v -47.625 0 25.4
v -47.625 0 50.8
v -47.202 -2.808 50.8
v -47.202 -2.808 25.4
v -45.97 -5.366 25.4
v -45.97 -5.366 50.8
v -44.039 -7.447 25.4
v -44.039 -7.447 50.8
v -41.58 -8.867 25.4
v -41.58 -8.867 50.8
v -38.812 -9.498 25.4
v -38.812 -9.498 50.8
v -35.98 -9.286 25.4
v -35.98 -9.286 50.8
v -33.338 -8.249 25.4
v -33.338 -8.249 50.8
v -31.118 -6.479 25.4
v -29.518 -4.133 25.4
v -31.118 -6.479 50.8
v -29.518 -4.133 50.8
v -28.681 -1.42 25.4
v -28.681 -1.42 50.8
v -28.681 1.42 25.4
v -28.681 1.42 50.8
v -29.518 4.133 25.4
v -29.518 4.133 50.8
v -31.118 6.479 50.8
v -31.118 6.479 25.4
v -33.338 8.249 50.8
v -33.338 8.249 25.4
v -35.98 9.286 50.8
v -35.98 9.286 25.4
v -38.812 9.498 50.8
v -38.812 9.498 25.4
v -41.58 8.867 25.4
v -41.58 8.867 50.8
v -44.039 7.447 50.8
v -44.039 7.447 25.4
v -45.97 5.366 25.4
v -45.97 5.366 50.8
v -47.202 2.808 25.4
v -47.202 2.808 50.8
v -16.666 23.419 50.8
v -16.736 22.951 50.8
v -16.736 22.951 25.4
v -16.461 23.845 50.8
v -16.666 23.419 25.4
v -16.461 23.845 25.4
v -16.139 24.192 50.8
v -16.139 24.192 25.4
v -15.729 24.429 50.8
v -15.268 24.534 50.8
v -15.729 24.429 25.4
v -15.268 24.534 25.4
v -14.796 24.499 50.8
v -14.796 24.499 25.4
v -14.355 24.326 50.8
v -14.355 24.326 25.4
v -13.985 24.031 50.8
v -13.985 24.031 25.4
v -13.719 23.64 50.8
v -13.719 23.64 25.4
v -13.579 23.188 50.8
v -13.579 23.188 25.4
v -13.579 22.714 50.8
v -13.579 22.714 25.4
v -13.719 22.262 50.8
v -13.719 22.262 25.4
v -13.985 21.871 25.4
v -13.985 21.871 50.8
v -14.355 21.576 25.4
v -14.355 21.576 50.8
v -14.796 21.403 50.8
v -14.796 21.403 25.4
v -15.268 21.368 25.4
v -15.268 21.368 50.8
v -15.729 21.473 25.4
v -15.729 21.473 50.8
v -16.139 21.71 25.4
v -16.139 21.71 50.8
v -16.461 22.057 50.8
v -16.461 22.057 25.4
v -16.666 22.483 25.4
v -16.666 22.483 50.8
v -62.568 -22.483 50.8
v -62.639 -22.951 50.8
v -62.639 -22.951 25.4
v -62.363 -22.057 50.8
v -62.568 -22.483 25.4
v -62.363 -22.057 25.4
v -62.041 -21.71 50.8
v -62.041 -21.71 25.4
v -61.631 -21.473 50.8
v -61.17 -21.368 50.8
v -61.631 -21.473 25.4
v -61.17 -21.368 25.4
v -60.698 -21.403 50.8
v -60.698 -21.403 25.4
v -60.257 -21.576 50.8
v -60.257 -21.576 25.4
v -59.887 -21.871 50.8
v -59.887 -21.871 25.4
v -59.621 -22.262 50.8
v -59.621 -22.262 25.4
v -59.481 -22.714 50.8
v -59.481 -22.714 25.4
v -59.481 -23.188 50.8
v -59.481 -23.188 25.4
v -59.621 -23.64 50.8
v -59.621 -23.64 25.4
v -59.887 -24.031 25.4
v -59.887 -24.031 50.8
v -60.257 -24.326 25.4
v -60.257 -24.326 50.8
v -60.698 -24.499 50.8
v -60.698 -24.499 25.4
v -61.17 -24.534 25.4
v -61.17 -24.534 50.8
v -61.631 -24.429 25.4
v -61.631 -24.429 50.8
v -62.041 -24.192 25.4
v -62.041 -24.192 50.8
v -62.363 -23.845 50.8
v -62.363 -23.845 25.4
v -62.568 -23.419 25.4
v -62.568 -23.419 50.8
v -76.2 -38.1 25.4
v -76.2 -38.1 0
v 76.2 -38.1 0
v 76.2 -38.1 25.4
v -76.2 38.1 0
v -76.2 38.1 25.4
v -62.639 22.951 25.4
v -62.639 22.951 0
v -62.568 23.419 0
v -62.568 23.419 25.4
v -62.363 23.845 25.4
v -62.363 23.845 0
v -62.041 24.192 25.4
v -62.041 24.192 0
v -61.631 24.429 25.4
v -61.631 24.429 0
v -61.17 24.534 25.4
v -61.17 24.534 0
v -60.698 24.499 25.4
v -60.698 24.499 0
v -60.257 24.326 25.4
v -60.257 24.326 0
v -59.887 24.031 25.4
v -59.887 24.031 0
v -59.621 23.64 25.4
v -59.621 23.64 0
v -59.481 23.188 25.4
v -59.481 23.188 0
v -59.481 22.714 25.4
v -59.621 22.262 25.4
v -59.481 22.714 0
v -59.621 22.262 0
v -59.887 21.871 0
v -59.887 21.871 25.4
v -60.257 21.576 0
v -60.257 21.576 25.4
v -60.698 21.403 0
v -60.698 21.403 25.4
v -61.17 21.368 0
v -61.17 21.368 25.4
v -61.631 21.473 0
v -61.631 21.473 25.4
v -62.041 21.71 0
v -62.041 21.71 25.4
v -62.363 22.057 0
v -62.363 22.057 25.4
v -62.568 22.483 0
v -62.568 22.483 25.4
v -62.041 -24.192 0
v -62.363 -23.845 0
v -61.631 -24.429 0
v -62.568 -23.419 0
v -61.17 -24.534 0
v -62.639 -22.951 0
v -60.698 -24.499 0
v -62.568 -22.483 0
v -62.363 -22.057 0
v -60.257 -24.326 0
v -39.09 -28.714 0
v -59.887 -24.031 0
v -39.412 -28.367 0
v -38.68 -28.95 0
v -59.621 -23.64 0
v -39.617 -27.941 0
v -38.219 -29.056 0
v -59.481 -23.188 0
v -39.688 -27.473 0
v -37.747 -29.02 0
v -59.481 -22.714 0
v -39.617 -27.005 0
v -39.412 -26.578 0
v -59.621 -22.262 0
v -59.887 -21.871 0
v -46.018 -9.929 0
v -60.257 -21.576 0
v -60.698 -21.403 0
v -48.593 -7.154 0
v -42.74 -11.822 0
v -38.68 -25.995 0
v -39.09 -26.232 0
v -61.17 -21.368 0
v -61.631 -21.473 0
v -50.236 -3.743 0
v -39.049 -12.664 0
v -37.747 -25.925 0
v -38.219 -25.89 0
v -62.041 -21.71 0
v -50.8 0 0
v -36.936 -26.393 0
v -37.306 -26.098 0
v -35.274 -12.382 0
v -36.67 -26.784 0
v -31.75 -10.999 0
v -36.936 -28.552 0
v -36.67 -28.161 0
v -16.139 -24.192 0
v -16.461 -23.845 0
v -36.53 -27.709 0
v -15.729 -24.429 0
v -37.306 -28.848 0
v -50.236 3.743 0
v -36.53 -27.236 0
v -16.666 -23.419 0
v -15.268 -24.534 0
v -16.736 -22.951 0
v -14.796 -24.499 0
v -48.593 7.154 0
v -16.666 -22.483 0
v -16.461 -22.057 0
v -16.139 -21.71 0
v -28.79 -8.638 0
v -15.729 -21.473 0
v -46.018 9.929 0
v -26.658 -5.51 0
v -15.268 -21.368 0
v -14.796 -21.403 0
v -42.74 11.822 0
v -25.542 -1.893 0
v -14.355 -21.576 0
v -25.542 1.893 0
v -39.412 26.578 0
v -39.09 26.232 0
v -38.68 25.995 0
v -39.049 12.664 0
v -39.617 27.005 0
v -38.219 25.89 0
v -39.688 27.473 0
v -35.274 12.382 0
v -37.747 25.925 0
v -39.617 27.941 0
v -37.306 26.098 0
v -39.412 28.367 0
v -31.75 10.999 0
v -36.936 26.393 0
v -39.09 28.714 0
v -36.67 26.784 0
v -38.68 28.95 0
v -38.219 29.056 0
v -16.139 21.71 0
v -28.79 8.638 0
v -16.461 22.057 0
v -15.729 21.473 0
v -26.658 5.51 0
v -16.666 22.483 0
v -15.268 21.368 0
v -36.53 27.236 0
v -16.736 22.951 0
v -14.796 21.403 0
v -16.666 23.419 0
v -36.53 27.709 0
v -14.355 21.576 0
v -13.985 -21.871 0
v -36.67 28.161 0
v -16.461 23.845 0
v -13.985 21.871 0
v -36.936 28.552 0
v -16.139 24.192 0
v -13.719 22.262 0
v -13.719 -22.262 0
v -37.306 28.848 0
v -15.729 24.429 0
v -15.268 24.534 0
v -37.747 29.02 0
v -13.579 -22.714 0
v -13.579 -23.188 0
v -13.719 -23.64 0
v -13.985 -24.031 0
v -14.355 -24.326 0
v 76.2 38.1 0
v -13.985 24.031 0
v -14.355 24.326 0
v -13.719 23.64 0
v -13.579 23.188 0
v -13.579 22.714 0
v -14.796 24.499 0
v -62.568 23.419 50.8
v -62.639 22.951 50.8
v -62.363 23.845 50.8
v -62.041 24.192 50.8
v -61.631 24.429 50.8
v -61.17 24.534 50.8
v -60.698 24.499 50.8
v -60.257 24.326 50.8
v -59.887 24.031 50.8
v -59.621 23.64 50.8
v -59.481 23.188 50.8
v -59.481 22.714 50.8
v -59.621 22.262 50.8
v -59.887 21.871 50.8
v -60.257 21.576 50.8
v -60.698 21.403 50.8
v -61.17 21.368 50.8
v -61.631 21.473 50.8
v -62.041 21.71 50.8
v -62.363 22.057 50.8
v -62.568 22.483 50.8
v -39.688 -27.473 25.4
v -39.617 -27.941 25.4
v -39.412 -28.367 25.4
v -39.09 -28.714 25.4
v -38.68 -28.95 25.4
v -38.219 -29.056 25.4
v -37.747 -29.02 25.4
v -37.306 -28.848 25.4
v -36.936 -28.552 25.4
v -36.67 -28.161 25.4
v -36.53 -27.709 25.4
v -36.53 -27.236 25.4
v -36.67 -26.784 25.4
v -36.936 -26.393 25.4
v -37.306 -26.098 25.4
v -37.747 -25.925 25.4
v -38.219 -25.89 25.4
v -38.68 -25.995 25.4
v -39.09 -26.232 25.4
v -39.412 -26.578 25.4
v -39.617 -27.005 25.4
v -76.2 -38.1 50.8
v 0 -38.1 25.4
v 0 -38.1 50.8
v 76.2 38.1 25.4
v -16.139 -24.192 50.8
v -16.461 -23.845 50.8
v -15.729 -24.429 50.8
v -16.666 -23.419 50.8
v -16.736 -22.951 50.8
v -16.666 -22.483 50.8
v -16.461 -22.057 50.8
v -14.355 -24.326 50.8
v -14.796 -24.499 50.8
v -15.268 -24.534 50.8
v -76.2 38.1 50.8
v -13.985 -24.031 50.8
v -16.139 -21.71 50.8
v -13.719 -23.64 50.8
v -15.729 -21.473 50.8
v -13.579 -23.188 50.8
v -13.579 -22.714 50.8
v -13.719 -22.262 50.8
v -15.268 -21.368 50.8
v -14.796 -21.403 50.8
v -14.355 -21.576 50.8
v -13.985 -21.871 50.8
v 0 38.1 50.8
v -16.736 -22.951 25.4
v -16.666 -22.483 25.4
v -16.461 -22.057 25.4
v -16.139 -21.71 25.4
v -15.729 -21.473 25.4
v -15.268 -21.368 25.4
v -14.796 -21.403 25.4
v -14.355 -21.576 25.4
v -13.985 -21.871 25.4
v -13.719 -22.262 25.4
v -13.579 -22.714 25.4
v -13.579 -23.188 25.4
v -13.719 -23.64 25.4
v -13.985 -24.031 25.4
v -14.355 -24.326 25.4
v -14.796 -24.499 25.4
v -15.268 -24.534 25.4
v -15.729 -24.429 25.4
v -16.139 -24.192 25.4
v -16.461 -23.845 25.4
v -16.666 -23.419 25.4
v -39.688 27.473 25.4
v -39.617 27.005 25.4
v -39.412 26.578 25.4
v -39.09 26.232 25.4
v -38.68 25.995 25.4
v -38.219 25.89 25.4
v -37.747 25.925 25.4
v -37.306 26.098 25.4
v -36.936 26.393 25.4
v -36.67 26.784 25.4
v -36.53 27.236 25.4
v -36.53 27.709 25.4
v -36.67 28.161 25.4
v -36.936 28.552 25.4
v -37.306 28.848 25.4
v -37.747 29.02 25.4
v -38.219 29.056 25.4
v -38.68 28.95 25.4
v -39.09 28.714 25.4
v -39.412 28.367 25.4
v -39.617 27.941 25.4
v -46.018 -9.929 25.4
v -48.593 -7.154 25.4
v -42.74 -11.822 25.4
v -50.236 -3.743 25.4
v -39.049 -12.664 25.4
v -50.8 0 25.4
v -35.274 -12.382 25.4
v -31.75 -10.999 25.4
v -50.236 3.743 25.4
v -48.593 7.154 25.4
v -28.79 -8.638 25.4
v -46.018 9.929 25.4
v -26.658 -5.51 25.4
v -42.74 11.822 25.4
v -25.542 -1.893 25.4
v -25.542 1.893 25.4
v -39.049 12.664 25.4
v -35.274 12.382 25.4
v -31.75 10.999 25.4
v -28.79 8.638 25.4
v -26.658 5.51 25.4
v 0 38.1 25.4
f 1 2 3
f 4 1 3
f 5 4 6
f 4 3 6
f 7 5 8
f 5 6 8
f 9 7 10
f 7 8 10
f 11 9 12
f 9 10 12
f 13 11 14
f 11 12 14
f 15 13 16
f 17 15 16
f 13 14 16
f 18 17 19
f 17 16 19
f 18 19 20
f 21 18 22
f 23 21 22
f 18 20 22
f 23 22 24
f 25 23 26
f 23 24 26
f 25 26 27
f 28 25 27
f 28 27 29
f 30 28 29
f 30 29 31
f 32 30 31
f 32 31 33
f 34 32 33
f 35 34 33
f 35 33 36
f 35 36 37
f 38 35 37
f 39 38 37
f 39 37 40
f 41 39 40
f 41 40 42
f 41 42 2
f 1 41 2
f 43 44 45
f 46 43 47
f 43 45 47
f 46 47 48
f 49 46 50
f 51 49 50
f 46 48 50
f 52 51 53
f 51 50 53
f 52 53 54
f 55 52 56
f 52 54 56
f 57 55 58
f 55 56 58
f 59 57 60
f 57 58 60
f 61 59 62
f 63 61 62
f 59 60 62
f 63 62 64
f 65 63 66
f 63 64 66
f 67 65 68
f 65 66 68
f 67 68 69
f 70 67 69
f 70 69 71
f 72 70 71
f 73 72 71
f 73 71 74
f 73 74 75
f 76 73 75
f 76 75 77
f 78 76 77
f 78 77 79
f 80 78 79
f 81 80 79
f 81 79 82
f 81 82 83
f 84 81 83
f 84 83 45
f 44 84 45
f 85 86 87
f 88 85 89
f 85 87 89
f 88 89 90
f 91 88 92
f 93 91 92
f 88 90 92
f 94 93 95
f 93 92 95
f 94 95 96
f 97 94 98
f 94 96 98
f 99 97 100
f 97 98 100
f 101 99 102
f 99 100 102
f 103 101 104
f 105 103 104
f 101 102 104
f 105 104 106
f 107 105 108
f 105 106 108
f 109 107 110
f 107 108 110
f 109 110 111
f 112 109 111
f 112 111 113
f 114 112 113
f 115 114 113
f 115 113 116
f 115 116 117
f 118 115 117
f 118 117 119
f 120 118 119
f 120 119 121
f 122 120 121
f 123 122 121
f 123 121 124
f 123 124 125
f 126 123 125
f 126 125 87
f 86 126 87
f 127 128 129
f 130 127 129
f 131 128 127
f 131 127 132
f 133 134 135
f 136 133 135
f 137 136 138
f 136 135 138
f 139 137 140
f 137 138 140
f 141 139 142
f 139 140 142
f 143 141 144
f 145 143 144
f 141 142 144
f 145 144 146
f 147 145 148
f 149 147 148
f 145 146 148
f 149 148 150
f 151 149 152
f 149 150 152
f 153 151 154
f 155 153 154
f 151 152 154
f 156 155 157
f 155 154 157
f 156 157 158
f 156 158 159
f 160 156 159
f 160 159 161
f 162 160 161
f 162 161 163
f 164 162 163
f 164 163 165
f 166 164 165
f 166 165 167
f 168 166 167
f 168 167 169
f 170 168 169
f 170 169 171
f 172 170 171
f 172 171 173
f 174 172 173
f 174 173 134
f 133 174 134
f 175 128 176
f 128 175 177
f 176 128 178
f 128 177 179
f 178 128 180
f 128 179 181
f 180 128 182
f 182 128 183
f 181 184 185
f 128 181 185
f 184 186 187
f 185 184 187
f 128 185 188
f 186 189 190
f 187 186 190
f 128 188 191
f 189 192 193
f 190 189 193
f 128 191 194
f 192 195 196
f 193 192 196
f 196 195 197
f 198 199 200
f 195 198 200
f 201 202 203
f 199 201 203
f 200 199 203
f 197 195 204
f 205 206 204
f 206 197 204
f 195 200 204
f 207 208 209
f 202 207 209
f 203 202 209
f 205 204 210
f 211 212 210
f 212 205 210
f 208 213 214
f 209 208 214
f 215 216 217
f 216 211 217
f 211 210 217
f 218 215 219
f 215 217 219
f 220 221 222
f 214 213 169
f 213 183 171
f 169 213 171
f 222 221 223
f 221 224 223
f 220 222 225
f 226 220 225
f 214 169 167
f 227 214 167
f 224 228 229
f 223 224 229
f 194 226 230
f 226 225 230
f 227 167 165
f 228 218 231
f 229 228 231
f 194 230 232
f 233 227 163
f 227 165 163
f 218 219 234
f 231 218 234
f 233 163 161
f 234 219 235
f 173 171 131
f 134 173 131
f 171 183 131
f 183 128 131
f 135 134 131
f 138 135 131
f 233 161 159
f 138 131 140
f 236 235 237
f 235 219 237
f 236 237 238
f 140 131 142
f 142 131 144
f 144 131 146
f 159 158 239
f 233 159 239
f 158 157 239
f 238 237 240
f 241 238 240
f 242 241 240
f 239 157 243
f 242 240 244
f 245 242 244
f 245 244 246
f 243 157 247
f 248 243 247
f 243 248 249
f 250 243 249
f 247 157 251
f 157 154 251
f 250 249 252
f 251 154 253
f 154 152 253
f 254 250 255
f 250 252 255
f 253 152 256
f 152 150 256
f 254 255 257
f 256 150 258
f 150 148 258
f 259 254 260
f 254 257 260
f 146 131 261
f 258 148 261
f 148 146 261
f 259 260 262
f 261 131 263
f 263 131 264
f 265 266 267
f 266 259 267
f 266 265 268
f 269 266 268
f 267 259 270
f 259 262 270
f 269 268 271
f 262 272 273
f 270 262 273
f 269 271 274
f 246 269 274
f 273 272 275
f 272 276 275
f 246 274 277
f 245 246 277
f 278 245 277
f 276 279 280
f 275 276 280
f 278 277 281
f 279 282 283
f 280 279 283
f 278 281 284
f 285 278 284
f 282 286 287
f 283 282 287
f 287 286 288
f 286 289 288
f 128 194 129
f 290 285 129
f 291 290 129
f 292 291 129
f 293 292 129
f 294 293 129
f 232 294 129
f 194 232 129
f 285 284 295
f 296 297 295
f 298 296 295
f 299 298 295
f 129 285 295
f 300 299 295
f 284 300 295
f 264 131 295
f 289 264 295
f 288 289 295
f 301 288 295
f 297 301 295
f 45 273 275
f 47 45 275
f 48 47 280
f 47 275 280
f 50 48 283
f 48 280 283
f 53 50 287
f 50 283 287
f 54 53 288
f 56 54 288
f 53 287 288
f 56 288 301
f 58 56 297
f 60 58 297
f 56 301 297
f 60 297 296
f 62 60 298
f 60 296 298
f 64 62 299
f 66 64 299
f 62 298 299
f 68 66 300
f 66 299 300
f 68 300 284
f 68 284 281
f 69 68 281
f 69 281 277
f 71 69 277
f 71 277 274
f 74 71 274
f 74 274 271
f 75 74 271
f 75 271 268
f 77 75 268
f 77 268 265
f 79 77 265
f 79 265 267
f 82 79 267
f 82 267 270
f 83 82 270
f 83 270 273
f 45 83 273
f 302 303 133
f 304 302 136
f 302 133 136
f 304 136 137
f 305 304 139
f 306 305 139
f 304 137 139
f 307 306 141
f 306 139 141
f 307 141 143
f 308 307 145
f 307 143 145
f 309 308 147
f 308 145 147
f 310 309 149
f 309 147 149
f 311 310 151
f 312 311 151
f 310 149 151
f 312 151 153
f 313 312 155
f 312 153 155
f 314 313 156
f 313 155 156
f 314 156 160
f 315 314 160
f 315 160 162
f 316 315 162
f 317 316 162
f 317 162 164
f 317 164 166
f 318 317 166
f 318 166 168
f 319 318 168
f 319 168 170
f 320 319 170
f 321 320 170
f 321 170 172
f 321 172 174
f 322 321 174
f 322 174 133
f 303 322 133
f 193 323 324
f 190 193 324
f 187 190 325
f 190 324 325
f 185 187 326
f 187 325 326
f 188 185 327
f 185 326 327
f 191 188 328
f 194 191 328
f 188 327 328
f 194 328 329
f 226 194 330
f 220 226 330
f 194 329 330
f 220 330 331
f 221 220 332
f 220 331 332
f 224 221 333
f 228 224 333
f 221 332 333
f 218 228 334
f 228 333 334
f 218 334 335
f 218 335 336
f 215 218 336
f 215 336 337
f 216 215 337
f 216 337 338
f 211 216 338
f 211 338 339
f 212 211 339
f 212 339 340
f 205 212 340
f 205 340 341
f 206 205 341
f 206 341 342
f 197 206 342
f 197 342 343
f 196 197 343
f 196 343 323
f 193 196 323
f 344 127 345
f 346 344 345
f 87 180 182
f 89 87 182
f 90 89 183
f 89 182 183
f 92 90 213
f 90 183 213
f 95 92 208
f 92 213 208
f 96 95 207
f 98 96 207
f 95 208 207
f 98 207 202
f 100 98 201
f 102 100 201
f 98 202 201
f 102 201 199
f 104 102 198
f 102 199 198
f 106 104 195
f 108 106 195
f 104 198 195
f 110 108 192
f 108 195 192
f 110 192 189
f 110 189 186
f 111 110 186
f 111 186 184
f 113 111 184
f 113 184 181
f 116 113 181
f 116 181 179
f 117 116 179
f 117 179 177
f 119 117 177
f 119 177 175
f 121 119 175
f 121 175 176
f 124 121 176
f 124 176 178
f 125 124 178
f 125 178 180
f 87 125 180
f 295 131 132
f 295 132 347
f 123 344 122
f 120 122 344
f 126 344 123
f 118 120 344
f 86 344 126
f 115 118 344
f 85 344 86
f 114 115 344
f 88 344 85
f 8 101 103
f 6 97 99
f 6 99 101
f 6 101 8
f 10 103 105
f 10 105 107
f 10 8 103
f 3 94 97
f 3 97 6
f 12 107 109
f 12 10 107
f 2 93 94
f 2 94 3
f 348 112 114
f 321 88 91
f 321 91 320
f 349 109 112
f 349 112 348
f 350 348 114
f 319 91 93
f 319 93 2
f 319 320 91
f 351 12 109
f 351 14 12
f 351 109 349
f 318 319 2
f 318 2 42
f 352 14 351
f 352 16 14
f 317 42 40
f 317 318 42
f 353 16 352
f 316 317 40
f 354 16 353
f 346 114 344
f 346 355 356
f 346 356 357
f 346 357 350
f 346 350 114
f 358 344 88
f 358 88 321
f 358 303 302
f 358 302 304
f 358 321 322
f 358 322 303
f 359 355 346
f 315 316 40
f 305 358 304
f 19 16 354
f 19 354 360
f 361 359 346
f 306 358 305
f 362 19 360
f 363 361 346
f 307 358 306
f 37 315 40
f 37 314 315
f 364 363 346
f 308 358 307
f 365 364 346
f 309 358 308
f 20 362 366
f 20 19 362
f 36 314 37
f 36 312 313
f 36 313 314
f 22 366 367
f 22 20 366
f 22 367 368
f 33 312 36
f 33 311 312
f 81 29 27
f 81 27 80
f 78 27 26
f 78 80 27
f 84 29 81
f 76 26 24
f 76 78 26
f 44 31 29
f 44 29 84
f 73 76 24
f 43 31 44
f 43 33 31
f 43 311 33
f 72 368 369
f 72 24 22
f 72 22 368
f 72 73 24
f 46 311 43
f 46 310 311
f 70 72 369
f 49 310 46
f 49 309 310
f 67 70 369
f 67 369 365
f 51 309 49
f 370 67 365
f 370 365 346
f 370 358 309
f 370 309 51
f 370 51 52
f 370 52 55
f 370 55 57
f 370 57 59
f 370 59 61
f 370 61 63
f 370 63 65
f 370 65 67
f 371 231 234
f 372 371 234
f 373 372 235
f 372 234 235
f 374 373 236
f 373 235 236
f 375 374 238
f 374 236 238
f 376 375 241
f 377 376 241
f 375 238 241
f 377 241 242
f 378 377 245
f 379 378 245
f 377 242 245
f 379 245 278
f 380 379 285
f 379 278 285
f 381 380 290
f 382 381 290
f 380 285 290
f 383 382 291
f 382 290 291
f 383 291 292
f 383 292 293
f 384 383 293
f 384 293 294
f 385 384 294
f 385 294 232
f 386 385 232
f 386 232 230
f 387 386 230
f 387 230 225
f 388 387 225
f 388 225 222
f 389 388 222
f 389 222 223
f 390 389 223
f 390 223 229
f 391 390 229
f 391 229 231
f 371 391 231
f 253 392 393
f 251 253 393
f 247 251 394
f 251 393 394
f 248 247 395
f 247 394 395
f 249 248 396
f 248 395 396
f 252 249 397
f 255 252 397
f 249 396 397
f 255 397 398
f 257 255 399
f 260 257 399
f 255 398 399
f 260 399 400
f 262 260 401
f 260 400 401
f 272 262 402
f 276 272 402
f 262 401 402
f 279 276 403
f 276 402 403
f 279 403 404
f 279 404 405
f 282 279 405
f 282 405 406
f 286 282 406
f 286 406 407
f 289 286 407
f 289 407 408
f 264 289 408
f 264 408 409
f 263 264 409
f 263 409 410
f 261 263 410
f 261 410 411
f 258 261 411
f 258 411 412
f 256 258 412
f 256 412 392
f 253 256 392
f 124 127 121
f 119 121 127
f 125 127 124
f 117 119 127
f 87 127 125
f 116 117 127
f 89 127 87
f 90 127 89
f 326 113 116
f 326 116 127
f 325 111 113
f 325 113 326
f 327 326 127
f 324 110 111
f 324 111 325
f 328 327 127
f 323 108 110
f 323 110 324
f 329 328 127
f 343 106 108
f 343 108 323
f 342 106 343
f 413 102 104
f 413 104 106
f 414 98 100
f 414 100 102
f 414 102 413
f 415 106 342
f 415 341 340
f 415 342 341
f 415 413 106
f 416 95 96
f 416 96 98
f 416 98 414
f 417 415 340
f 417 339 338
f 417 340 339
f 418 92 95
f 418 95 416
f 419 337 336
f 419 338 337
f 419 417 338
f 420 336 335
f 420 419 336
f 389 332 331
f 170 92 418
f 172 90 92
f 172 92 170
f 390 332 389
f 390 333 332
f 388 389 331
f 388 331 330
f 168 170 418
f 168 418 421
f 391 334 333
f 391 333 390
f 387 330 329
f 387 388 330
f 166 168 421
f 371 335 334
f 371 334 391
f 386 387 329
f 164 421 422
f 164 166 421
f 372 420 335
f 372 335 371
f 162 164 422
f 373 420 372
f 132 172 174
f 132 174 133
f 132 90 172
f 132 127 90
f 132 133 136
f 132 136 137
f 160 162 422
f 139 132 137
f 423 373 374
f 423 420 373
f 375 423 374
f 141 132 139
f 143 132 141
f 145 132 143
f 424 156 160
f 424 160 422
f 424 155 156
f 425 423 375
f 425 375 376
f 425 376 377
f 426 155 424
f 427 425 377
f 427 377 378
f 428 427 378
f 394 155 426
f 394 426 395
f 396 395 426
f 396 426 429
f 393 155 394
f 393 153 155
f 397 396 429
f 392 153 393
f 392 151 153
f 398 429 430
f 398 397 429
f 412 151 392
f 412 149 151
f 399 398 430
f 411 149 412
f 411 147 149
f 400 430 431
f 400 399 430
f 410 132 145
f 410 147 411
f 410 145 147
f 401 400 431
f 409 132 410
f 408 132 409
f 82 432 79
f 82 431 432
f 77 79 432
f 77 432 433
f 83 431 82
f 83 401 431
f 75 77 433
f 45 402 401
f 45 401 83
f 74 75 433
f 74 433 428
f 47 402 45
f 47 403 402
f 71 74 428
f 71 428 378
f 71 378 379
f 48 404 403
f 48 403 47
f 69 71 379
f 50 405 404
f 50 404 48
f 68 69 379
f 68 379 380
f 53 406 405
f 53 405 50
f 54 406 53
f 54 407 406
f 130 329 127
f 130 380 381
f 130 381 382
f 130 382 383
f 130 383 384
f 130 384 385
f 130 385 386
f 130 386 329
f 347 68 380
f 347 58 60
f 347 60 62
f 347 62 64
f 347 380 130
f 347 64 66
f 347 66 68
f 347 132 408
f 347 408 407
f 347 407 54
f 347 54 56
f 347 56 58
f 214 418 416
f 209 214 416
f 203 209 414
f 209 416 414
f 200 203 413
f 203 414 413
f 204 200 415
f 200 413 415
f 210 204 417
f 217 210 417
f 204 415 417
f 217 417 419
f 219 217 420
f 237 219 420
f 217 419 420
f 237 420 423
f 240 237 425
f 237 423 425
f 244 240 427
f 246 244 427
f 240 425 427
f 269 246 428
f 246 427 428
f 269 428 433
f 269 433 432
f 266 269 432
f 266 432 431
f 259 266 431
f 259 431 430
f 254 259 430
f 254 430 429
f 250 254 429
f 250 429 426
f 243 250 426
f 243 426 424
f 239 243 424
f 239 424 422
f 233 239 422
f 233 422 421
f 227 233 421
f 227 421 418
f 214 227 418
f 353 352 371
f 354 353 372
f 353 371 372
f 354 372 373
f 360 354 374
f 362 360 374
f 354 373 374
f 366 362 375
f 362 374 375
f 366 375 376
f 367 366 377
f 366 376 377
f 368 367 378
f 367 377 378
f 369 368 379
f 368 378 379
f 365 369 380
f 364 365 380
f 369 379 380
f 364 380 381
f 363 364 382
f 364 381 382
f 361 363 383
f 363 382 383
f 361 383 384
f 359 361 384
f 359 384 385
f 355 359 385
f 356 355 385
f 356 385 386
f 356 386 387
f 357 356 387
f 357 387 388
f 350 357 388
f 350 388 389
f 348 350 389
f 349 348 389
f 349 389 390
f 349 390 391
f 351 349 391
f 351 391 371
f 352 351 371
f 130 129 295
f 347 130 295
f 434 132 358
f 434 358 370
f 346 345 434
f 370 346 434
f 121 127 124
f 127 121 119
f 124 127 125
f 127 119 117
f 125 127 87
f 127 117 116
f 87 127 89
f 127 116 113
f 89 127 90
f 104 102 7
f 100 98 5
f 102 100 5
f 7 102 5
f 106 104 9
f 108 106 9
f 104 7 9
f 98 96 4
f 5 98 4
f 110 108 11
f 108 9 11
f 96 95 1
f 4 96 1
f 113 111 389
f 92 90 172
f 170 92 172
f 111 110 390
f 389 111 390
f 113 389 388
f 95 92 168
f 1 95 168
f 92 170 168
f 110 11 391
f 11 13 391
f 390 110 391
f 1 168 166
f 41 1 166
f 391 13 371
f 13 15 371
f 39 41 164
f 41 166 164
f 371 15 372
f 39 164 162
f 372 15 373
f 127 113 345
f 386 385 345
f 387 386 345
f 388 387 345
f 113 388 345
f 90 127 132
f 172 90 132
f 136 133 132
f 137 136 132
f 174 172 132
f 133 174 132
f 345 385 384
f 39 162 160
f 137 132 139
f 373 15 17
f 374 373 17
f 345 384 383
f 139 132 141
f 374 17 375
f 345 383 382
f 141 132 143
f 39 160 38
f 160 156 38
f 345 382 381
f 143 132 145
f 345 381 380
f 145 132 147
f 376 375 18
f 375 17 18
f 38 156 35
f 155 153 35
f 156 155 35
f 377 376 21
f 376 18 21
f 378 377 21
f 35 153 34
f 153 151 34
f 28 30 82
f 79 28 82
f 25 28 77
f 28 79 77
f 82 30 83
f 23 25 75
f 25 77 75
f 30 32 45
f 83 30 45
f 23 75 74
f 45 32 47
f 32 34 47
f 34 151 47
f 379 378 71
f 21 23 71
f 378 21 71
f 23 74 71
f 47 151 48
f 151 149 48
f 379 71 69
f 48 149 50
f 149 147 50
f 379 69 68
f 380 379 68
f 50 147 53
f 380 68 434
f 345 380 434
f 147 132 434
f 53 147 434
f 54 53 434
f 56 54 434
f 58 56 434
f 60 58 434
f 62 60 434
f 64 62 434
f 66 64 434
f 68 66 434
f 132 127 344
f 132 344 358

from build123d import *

# Parameters (mm, degrees)
F0_W     = 152.4
F0_H     = 76.2
F2_DEPTH = 25.4
F4_D     = 25.4
F5_D     = 3.175
F3_W     = 76.2
F3_H     = 76.2
F6_DEPTH = 25.4
F8_D     = 3.175
F8_2_D   = 3.175
F9_D     = 19.05


with BuildPart() as f2:
    # F0 (on Top) → F2 (new body)
    with BuildSketch(Plane.XY):
        Rectangle(F0_W, F0_H)
    extrude(amount=F2_DEPTH)

    # F4 (through all)
    with Locations(Plane(origin=(0, 0, 0), x_dir=(1, 0, 0), z_dir=(0, 0, -1))):
        with Locations((-38.1, 0)):
            Hole(F4_D / 2)

    # F5 (through all)
    with Locations(Plane(origin=(0, 0, 0), x_dir=(1, 0, 0), z_dir=(0, 0, -1))):
        with Locations((-38.1, 27.472701), (-38.1, -27.472701)):
            Hole(F5_D / 2)

    # F8 (through all)
    with Locations(Plane.XY.offset(50.8)):
        with Locations((-15.148959, 22.951041), (-15.148959, -22.951041), (-61.051041, -22.951041), (-61.051041, 22.951041)):
            Hole(F8_D / 2)


with BuildPart() as f6:
    # F3 (on face) → F6 (new body)
    with BuildSketch(Plane.XY.offset(25.4)):
        with Locations((-38.1, 0)):
            Rectangle(F3_W, F3_H)
    extrude(amount=F6_DEPTH)

    # F8#2 (through all)
    with Locations(Plane.XY.offset(50.8)):
        with Locations((-15.148959, 22.951041), (-15.148959, -22.951041), (-61.051041, -22.951041), (-61.051041, 22.951041)):
            Hole(F8_2_D / 2)

    # F9 (through all)
    with Locations(Plane(origin=(0, 0, 0), x_dir=(1, 0, 0), z_dir=(0, 0, -1))):
        with Locations((-38.1, 0)):
            Hole(F9_D / 2)


solid = Compound([f2.part, f6.part])
